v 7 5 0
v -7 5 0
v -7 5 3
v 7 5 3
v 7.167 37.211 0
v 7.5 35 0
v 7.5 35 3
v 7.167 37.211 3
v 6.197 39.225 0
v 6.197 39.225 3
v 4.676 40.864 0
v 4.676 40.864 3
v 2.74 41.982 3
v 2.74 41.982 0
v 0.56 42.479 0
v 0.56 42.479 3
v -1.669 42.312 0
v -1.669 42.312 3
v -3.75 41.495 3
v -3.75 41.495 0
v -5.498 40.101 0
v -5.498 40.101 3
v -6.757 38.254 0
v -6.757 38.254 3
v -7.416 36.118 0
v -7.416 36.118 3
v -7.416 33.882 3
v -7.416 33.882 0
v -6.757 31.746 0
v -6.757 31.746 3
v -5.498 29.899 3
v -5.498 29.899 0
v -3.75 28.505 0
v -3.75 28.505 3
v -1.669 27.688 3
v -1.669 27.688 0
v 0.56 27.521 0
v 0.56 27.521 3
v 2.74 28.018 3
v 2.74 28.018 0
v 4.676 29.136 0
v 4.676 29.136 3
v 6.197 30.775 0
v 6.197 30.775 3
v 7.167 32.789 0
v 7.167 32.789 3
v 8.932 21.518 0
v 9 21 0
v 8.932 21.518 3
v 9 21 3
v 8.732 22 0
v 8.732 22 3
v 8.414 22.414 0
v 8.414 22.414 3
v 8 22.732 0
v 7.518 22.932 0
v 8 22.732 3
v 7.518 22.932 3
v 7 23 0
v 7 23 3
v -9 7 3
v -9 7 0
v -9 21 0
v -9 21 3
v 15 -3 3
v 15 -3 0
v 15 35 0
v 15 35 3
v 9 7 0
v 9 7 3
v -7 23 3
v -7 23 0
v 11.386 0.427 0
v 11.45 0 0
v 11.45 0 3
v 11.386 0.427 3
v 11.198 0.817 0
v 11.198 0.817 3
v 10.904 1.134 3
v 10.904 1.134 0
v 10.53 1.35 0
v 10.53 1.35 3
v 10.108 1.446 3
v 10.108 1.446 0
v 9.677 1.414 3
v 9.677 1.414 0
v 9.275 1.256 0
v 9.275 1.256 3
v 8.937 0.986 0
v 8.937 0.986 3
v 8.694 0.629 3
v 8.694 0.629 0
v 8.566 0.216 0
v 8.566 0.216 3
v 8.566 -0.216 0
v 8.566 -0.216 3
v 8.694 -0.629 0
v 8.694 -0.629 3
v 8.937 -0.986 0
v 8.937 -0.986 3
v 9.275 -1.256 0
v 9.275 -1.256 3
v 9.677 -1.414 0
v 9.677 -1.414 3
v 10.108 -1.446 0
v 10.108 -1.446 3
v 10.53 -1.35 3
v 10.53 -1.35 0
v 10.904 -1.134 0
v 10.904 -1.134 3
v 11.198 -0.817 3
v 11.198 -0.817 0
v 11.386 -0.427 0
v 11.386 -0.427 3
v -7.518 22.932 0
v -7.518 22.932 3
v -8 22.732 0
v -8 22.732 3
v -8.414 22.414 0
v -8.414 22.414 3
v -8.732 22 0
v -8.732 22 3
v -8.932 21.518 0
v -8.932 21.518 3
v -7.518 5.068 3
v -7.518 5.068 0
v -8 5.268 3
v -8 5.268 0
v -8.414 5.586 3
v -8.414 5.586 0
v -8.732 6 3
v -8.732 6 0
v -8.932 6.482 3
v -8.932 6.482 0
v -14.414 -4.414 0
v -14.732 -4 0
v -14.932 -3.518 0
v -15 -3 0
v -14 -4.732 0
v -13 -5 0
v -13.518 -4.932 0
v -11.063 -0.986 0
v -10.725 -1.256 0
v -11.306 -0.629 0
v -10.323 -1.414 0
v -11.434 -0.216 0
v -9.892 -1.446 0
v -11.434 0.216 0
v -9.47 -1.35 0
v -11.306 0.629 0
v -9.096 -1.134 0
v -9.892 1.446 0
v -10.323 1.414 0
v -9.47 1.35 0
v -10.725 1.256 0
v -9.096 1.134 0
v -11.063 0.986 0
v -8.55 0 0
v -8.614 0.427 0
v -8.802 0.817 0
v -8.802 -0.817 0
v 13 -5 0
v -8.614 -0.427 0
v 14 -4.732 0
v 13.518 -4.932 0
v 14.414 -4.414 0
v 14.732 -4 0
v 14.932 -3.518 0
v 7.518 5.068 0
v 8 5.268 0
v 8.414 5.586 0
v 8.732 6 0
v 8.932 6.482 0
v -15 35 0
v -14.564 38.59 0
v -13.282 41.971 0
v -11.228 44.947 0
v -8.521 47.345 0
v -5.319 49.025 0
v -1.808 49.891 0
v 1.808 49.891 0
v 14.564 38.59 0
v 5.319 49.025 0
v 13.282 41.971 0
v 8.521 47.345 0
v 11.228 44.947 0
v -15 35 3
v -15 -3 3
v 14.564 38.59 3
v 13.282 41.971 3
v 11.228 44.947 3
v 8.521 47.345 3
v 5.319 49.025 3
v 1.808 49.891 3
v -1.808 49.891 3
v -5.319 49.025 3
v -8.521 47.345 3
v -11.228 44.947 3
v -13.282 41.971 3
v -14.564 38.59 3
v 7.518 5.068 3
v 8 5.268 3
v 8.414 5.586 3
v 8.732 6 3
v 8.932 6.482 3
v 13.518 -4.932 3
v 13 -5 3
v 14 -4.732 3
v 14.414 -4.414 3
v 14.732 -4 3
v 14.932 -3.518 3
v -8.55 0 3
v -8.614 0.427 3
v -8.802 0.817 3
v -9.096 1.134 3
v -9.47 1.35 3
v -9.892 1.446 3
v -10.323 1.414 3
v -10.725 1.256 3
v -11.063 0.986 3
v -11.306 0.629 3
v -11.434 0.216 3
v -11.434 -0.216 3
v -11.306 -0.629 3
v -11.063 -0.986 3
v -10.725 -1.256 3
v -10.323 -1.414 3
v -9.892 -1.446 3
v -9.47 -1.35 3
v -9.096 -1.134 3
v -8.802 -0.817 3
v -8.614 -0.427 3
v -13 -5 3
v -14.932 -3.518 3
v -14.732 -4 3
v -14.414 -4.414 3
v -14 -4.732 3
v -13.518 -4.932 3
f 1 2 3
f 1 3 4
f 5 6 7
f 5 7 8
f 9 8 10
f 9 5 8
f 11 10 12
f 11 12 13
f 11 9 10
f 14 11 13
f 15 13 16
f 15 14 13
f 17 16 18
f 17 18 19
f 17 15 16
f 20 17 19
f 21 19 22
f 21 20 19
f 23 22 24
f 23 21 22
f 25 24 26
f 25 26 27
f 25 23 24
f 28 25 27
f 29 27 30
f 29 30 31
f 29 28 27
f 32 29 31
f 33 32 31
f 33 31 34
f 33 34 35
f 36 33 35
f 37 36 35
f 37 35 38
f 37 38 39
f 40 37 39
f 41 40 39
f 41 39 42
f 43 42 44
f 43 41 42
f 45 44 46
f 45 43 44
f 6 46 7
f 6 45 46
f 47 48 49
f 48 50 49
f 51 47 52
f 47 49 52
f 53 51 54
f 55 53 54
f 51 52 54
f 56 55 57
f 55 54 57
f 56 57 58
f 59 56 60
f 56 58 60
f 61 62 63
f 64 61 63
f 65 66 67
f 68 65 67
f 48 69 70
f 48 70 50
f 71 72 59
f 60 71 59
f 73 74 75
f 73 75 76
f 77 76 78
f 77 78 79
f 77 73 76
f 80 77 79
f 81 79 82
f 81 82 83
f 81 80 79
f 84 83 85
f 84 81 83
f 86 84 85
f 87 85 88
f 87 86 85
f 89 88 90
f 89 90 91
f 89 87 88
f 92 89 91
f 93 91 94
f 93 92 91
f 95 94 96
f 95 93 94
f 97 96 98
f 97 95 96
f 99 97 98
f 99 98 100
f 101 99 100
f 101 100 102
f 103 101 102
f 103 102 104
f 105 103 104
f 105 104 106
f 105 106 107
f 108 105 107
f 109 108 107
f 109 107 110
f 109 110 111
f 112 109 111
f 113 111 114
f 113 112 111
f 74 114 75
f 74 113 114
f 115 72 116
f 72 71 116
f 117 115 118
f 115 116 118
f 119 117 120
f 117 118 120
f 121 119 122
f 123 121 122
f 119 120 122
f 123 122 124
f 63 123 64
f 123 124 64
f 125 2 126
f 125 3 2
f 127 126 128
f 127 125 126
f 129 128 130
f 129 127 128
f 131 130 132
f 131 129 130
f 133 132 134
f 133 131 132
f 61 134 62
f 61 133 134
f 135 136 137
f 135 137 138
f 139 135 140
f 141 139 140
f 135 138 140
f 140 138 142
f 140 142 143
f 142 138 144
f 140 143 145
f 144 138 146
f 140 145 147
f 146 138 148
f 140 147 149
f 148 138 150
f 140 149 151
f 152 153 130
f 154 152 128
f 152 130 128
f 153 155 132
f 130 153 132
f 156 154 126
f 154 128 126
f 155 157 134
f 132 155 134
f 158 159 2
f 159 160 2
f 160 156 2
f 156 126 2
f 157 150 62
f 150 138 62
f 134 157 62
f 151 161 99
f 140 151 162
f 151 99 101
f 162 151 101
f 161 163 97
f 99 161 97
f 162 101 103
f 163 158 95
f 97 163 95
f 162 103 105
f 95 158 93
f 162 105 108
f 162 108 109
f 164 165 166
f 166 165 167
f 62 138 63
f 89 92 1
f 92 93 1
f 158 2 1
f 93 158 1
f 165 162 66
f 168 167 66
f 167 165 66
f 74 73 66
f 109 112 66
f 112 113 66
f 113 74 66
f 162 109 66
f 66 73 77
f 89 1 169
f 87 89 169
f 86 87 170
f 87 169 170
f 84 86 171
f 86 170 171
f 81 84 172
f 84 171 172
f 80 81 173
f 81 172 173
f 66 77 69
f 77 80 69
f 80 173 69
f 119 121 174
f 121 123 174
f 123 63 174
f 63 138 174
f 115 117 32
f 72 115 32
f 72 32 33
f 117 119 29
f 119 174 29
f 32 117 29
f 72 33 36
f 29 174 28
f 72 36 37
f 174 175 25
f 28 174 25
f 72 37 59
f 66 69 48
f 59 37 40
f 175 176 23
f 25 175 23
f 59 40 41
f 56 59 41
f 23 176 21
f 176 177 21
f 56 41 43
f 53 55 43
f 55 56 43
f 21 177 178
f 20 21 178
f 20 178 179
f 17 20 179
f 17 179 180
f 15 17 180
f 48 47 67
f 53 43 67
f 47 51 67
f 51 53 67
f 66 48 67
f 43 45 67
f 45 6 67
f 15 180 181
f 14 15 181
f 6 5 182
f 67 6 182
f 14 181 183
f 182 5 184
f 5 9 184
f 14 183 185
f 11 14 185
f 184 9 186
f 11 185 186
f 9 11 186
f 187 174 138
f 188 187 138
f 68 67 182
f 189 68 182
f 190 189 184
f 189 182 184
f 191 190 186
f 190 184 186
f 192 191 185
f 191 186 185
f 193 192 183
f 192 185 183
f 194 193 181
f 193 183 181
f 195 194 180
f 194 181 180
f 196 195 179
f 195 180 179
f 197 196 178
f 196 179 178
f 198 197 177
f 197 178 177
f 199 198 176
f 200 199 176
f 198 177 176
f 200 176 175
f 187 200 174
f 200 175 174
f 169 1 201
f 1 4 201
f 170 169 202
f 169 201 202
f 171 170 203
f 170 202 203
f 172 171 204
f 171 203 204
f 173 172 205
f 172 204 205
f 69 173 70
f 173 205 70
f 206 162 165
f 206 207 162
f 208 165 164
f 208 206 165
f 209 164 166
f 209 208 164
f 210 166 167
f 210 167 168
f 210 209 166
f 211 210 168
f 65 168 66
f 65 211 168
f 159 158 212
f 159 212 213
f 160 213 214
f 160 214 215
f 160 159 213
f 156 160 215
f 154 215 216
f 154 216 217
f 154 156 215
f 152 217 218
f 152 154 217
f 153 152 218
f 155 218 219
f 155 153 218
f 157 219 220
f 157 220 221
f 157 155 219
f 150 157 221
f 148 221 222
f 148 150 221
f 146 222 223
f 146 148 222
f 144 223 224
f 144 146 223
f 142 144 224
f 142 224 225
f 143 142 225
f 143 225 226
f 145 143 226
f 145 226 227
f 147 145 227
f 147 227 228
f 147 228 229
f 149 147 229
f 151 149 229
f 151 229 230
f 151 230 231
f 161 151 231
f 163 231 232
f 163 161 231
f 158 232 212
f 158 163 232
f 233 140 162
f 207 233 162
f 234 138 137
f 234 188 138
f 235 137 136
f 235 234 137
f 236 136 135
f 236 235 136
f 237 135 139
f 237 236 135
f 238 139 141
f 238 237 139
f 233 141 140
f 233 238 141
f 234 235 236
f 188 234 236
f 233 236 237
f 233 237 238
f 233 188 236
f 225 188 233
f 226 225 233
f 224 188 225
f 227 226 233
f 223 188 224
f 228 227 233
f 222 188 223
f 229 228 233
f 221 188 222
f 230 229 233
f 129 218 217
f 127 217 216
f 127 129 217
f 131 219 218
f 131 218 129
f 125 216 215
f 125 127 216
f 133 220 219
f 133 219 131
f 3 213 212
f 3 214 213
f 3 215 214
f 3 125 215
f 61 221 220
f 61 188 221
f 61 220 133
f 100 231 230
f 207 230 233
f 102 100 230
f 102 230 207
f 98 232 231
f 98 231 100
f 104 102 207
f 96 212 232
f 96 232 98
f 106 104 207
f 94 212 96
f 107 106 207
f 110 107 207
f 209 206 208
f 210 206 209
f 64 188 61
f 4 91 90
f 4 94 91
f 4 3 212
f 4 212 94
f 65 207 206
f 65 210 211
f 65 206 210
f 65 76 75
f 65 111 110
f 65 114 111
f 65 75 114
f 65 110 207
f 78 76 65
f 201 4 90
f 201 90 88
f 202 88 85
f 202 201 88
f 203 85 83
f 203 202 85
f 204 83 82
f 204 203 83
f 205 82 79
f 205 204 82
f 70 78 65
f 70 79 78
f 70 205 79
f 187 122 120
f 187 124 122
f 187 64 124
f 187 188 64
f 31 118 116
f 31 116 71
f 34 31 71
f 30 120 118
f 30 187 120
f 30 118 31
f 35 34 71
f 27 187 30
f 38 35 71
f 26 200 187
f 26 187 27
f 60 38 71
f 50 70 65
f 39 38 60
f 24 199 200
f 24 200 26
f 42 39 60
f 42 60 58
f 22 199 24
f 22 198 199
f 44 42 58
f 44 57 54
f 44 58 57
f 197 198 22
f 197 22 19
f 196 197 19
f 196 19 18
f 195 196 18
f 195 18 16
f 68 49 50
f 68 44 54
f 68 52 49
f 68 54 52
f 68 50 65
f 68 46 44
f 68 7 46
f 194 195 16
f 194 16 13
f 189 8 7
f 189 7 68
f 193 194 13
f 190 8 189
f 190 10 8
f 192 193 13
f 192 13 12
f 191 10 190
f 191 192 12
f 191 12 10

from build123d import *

# Parameters (mm, degrees)
SKETCH_1_R      = 7.5
SKETCH_1_R_2    = 1.45
SKETCH_1_W      = 18
SKETCH_1_H      = 18
EXTRUDE_1_DEPTH = 3
FILLET_1_R      = 2


with BuildPart() as part:
    # 草图1 → 凸台-拉伸1 (new body)
    with BuildSketch(Plane.XY):
        with BuildLine():
            Line((-15, 35), (-15, -5))
            Line((-15, -5), (15, -5))
            Line((15, -5), (15, 35))
            ThreePointArc((15, 35), (0, 50), (-15, 35))
        make_face()
        with Locations((0, 35)):
            Circle(SKETCH_1_R, mode=Mode.SUBTRACT)
        with Locations((-10, 0)):
            Circle(SKETCH_1_R_2, mode=Mode.SUBTRACT)
        with Locations((10, 0)):
            Circle(SKETCH_1_R_2, mode=Mode.SUBTRACT)
        with Locations((0, 14)):
            Rectangle(SKETCH_1_W, SKETCH_1_H, mode=Mode.SUBTRACT)
    extrude(amount=EXTRUDE_1_DEPTH)

    # 圆角1
    fillet_1_edges = [part.edges().sort_by_distance(p)[0] for p in [
        (9, 5, 1.5),
        (9, 23, 1.5),
        (-9, 23, 1.5),
        (-9, 5, 1.5),
        (15, -5, 1.5),
        (-15, -5, 1.5),
    ]]
    fillet(fillet_1_edges, radius=FILLET_1_R)


solid = part.part
